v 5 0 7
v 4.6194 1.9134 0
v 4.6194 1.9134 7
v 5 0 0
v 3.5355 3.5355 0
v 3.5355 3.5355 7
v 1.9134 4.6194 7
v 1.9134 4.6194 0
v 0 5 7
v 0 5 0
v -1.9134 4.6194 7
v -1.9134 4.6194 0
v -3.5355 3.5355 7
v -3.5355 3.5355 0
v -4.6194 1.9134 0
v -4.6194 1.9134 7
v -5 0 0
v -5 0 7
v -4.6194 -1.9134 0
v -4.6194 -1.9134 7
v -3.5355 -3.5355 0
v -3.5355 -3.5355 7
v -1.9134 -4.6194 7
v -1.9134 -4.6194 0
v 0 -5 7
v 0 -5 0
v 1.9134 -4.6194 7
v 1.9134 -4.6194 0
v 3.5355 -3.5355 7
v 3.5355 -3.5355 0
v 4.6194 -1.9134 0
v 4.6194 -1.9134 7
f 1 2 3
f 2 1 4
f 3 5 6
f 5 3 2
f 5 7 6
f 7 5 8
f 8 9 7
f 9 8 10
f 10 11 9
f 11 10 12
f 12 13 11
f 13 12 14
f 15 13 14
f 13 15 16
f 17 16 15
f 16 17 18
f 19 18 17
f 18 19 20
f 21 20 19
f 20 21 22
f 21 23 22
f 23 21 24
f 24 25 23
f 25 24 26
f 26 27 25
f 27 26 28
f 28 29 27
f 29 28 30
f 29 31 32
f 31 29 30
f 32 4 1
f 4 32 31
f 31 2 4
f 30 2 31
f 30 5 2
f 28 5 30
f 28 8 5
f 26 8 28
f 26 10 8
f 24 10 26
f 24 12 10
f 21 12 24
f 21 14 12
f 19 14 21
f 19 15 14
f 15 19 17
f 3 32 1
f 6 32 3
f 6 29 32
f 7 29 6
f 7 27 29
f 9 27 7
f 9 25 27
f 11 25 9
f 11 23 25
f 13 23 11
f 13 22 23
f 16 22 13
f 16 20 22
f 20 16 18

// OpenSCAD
// Generated by SolidPython 1.0.1 on 2020-07-29 00:46:44


cylinder(h = 7, r1 = 5, r2 = 5);
/***********************************************
*********      SolidPython code:      **********
************************************************
 
# import packages: SolidPython
from solid import *
from solid.utils import *
from itertools import chain, combinations, permutations


class Resize:

    def __init__(self, scad_file):
        self.scad_file = scad_file
        #self.scad_file = import_scad(scad_file)
        # cone/cylinder param:
        self.r1 = 0
        self.r2 = 0
        self.h = 0
        # rectangular prism param:
        self.w = 0
        self.l = 0
        # ellipse param:
        self.r = 0

    # import OpenScad code (file name corresponds to shape)


    # classify shape + parameters
    def assign(self, param1, param2, param3):
        if self.scad_file == 'cone.scad':
            self.r1 = param1
            self.r2 = param2
            self.h = param3
        elif self.scad_file == 'cylinder.scad':
            self.r1 = param1
            self.r2 = param2
            self.h = param3
        elif self.scad_file == 'rectangularPrism.scad':
            self.h = param1
            self.l = param2
            self.w = param3
        else:
            self.r = param1
            self.h = param2

    # resize parameters
    def iterate(self):
        x = range(3, 20, 2)
        i = 1
        if self.scad_file == 'cone.scad':
            tempList = list(permutations(x, 2))
            for temp in tempList:
                param1 = temp[0]
                param2 = temp[1]
                filepath = 'produced_scad_files/' + 'cone' + str(param1) + '_' + str(param2) + '_' + '.scad'
                scad_render_to_file(cylinder(h=param1, r1=param2, r2=0), filepath)

        elif self.scad_file == 'cylinder.scad':
            tempList = list(permutations(x, 3))
            for temp in tempList:
                param1 = temp[0]
                param2 = temp[1]
                filepath = 'produced_scad_files/' + 'cylinder' + str(param1) + '_' + str(param2) + '_' + '.scad'
                scad_render_to_file(cylinder(h=param1, r1=param2, r2=param2), filepath)

        elif self.scad_file == 'rectangularPrism.scad':
            tempList = list(permutations(x, 3))
            for temp in tempList:
                param1 = temp[0]
                param2 = temp[1]
                param3 = temp[2]
                filepath = 'produced_scad_files/' + 'rectangularPrism' + str(param1) + '_' + str(param2) + '_' + str(
                    param3) + '.scad'
                scad_render_to_file(cube(size=(param1, param2, param3)), filepath)

        elif self.scad_file == 'ellipse.scad':
            tempList = list(permutations(x, 4))
            for temp in tempList:
                param1 = temp[0]
                param2 = temp[1]
                param3 = temp[2]
                param4 = temp[3]
                filepath = 'produced_scad_files/' + 'ellipse' + str(param1) + '_' + str(param2) + '_' + str(param3) + '_' + str(param4) + '.scad'
                scad_render_to_file(scale([param1, param2, param3])(sphere(r=param4)), filepath)

    def render_to_scadfile(self):
        scad_render_to_file(scad, 'example.scad') 
 
************************************************/
